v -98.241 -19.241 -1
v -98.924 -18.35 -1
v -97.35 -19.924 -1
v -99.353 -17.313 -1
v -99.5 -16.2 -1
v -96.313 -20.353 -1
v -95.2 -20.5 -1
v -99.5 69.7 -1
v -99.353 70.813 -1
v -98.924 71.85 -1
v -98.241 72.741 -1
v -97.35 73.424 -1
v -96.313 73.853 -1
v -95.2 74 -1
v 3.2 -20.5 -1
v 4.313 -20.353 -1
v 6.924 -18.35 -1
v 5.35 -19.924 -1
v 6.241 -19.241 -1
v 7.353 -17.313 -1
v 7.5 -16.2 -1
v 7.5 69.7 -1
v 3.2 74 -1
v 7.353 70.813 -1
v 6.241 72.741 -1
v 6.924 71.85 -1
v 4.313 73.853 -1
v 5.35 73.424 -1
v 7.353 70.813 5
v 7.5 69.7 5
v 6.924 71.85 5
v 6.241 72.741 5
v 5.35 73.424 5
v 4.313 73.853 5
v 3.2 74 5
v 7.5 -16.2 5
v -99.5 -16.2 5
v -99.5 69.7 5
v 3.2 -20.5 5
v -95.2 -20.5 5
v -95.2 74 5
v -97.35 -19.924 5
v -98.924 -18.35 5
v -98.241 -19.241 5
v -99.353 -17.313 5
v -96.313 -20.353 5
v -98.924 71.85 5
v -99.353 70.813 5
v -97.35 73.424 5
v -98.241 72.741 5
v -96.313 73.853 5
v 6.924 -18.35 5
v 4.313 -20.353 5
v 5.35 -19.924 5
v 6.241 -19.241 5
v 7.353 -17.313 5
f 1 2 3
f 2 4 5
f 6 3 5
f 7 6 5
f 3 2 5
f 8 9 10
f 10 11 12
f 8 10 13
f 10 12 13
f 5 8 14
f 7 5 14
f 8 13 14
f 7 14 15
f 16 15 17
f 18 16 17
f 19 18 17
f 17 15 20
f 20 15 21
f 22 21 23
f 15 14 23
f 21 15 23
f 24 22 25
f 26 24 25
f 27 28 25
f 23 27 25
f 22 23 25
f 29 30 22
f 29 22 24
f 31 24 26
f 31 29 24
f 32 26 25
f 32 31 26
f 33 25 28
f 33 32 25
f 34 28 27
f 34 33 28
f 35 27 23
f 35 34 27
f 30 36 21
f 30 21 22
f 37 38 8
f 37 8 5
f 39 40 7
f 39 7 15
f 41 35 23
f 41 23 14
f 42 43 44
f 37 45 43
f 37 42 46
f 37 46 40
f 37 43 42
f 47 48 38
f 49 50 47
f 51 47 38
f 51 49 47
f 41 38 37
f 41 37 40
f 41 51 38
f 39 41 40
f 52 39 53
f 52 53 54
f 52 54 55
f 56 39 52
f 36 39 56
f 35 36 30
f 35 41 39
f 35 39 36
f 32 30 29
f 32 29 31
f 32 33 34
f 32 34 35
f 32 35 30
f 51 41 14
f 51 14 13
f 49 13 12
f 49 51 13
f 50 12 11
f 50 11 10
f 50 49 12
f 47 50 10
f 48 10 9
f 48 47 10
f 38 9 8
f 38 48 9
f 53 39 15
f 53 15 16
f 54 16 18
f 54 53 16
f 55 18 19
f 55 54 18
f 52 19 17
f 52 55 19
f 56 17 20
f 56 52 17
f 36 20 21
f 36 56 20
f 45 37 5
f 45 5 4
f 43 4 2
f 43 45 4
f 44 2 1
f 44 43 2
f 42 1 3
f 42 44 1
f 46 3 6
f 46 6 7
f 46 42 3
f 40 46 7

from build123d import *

# Parameters (mm, degrees)
BOSS_EXTRUDE3_DEPTH = 5
BOSS_EXTRUDE5_DEPTH = 6


with BuildPart() as part:
    # Sketch3 → Boss-Extrude3 (new body)
    with BuildSketch(Plane.XY):
        with BuildLine():
            Line((-97.5, 69.7), (-97.5, -16.2))
            ThreePointArc((-97.5, -16.2), (-96.826345597, -17.826345597), (-95.2, -18.5))
            Line((-95.2, -18.5), (3.2, -18.5))
            ThreePointArc((3.2, -18.5), (4.826345597, -17.826345597), (5.5, -16.2))
            Line((5.5, -16.2), (5.5, 69.7))
            ThreePointArc((5.5, 69.7), (4.826345597, 71.326345597), (3.2, 72))
            Line((3.2, 72), (-95.2, 72))
            ThreePointArc((-95.2, 72), (-96.826345597, 71.326345597), (-97.5, 69.7))
        make_face()
    extrude(amount=BOSS_EXTRUDE3_DEPTH)

    # Sketch4 → Boss-Extrude5 (add)
    with BuildSketch(Plane.XY.offset(5)):
        with BuildLine():
            Line((-99.5, 69.7), (-99.5, -16.2))
            ThreePointArc((-99.5, -16.2), (-98.240559159, -19.240559159), (-95.2, -20.5))
            Line((-95.2, -20.5), (3.2, -20.5))
            ThreePointArc((3.2, -20.5), (6.240559159, -19.240559159), (7.5, -16.2))
            Line((7.5, -16.2), (7.5, 69.7))
            ThreePointArc((7.5, 69.7), (6.240559159, 72.740559159), (3.2, 74))
            Line((3.2, 74), (-95.2, 74))
            ThreePointArc((-95.2, 74), (-98.240559159, 72.740559159), (-99.5, 69.7))
        make_face()
    extrude(amount=-BOSS_EXTRUDE5_DEPTH)


solid = part.part
